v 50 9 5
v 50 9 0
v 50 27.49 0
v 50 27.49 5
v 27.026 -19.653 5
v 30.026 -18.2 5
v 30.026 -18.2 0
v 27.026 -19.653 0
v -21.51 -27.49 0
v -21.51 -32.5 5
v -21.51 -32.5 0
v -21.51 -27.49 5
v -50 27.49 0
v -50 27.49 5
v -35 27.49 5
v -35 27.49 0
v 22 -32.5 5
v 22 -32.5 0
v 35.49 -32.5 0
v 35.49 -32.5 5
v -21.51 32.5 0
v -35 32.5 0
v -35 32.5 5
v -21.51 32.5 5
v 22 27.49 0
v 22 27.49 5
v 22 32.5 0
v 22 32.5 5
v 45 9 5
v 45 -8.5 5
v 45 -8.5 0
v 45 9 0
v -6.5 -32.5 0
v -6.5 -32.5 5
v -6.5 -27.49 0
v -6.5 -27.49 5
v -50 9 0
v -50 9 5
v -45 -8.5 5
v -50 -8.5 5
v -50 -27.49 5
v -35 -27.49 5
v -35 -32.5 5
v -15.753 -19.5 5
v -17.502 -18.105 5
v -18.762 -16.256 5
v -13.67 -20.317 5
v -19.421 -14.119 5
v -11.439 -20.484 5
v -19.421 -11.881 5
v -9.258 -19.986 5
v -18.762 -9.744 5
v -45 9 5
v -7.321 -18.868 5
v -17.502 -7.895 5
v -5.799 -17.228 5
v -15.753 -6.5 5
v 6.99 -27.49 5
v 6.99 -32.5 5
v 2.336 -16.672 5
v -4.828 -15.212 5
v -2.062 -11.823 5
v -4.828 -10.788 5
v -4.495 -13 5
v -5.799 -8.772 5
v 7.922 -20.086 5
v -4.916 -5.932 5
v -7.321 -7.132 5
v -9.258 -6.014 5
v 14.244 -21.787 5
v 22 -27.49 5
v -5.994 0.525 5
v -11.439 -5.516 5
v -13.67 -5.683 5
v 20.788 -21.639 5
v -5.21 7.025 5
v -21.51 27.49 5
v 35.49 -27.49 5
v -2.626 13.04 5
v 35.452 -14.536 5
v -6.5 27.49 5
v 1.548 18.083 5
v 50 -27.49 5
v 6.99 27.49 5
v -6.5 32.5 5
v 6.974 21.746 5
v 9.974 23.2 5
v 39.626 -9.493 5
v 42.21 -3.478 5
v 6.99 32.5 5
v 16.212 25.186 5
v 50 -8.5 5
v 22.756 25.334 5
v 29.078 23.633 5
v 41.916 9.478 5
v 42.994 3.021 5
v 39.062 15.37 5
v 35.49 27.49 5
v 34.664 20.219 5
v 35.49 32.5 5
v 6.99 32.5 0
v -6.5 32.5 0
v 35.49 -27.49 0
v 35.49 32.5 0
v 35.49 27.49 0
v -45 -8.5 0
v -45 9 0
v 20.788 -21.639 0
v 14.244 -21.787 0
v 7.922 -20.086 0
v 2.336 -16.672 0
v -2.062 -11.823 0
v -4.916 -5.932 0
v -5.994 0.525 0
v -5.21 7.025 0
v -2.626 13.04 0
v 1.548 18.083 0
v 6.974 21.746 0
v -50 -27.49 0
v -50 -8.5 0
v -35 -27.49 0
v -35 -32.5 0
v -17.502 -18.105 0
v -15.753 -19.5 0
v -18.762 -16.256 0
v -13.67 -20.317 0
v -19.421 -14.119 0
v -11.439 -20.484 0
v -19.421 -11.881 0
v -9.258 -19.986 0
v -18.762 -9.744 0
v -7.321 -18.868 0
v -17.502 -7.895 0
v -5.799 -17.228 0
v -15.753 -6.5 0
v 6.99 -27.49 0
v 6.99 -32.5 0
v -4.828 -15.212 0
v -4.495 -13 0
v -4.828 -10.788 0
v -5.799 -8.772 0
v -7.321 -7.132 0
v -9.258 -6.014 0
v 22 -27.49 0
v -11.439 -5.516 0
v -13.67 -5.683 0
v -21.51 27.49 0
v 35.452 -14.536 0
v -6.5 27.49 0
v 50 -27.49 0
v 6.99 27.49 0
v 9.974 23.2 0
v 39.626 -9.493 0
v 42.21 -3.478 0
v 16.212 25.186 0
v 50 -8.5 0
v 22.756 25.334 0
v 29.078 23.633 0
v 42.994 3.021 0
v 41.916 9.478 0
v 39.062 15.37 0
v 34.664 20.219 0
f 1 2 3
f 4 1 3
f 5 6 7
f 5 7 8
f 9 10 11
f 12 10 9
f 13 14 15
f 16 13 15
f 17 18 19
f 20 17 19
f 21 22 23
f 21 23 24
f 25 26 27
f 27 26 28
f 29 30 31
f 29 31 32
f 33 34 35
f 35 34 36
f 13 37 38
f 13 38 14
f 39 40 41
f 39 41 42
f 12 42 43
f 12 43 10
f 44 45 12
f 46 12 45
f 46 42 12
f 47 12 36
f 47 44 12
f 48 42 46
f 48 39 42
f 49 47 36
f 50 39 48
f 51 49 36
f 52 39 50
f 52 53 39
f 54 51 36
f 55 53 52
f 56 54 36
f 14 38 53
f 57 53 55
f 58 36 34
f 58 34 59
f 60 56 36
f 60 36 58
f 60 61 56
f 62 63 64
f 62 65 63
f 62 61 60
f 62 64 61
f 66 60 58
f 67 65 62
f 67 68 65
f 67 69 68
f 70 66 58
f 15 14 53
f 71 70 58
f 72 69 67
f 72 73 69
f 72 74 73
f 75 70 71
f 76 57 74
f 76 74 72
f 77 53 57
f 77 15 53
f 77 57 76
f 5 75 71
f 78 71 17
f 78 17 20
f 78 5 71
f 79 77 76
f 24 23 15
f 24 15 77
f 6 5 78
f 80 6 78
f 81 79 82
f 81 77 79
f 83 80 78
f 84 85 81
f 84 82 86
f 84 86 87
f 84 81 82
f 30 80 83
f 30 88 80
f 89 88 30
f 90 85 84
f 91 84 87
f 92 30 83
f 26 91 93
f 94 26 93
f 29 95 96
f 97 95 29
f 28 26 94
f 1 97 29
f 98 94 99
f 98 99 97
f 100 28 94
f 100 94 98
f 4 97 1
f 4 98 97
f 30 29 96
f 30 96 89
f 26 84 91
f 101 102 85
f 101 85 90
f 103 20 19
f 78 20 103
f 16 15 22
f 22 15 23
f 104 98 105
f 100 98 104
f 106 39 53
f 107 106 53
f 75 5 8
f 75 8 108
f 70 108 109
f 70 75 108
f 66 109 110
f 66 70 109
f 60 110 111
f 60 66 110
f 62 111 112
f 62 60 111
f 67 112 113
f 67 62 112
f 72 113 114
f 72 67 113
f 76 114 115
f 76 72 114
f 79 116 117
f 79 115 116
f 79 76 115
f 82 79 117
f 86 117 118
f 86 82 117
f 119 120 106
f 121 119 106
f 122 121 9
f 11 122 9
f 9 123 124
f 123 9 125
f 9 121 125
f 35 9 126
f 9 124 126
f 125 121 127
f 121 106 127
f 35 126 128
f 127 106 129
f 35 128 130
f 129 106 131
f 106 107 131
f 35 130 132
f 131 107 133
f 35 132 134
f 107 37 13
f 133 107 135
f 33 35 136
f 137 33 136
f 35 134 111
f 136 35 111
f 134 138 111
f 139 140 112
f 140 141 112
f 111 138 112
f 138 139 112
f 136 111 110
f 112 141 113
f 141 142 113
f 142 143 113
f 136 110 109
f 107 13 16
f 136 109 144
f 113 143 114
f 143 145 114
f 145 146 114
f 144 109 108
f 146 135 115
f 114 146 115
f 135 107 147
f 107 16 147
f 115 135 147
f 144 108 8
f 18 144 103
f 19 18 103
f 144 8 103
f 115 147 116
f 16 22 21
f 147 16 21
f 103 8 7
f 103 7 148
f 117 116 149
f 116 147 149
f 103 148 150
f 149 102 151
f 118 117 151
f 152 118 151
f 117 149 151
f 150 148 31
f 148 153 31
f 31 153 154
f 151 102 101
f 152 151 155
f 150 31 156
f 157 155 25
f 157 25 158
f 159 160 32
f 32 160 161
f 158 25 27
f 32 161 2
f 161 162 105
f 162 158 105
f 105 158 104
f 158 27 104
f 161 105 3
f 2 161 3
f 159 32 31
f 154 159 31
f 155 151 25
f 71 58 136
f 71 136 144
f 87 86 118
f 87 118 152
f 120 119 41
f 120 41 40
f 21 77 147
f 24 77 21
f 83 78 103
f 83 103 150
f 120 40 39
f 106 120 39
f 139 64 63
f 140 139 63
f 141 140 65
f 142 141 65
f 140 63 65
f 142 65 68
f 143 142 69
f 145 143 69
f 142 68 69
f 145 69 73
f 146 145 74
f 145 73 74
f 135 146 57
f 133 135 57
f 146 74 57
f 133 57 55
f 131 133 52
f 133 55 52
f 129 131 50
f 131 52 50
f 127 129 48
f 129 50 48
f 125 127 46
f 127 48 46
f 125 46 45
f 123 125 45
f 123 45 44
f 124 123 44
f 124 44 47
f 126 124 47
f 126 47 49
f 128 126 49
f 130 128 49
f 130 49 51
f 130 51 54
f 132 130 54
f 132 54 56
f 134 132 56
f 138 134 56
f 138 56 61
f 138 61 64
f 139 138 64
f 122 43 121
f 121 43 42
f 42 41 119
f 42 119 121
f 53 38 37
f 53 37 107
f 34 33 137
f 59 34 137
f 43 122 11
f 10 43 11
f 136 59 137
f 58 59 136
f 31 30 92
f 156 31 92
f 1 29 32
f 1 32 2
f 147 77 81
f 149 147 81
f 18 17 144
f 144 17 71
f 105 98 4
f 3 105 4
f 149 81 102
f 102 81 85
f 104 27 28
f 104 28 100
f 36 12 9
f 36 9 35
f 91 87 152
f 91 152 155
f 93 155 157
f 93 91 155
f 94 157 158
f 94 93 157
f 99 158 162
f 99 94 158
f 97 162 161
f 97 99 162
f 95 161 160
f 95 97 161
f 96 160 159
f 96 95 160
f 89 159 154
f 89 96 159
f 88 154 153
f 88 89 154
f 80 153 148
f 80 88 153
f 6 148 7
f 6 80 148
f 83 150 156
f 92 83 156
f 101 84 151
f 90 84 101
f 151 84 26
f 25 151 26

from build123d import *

# Parameters (mm, degrees)
ESQUISSE1_W             = 100
ESQUISSE1_H             = 65
BOSS_EXTRU_1_DEPTH      = 5
ESQUISSE2_W             = 15
ESQUISSE2_H             = 5.01
ESQUISSE2_W_2           = 15.01
ESQUISSE2_W_3           = 14.51
ESQUISSE2_W_4           = 5
ESQUISSE2_H_2           = 17.5
ENL_V_MAT_EXTRU_1_DEPTH = 5
ESQUISSE3_R             = 7.505
ENL_V_MAT_EXTRU_2_DEPTH = 10


with BuildPart() as part:
    # Esquisse1 → Boss.-Extru.1 (new body)
    with BuildSketch(Plane.XY):
        Rectangle(ESQUISSE1_W, ESQUISSE1_H)
    extrude(amount=BOSS_EXTRU_1_DEPTH)

    # Esquisse2 → Enlèv. mat.-Extru.1 (cut)
    with BuildSketch(Plane.XY.offset(5)):
        with Locations((-42.5, 29.995)):
            Rectangle(ESQUISSE2_W, ESQUISSE2_H)
        with Locations((-14.005, 29.995)):
            Rectangle(ESQUISSE2_W_2, ESQUISSE2_H)
        with Locations((14.495, 29.995)):
            Rectangle(ESQUISSE2_W_2, ESQUISSE2_H)
        with Locations((42.745, 29.995)):
            Rectangle(ESQUISSE2_W_3, ESQUISSE2_H)
        with Locations((-47.5, 0.25)):
            Rectangle(ESQUISSE2_W_4, ESQUISSE2_H_2)
        with Locations((47.5, 0.25)):
            Rectangle(ESQUISSE2_W_4, ESQUISSE2_H_2)
        with Locations((42.745, -29.995)):
            Rectangle(ESQUISSE2_W_3, ESQUISSE2_H)
        with Locations((14.495, -29.995)):
            Rectangle(ESQUISSE2_W_2, ESQUISSE2_H)
        with Locations((-14.005, -29.995)):
            Rectangle(ESQUISSE2_W_2, ESQUISSE2_H)
        with Locations((-42.5, -29.995)):
            Rectangle(ESQUISSE2_W, ESQUISSE2_H)
    extrude(amount=-ENL_V_MAT_EXTRU_1_DEPTH, mode=Mode.SUBTRACT)

    # Esquisse3 → Enlèv. mat.-Extru.2 (cut)
    with BuildSketch(Plane.XY.offset(5)):
        with Locations((-12, -13)):
            Circle(ESQUISSE3_R)
        with BuildLine():
            Line((6.973645564, 21.746445448), (9.973645564, 23.199570448))
            ThreePointArc((9.973645564, 23.199570448), (40.699570448, 12.526354436), (30.026354436, -18.199570448))
            Line((30.026354436, -18.199570448), (27.026354436, -19.652695448))
            ThreePointArc((27.026354436, -19.652695448), (-3.699570448, -8.979479436), (6.973645564, 21.746445448))
        make_face()
    extrude(amount=-ENL_V_MAT_EXTRU_2_DEPTH, mode=Mode.SUBTRACT)


solid = part.part
